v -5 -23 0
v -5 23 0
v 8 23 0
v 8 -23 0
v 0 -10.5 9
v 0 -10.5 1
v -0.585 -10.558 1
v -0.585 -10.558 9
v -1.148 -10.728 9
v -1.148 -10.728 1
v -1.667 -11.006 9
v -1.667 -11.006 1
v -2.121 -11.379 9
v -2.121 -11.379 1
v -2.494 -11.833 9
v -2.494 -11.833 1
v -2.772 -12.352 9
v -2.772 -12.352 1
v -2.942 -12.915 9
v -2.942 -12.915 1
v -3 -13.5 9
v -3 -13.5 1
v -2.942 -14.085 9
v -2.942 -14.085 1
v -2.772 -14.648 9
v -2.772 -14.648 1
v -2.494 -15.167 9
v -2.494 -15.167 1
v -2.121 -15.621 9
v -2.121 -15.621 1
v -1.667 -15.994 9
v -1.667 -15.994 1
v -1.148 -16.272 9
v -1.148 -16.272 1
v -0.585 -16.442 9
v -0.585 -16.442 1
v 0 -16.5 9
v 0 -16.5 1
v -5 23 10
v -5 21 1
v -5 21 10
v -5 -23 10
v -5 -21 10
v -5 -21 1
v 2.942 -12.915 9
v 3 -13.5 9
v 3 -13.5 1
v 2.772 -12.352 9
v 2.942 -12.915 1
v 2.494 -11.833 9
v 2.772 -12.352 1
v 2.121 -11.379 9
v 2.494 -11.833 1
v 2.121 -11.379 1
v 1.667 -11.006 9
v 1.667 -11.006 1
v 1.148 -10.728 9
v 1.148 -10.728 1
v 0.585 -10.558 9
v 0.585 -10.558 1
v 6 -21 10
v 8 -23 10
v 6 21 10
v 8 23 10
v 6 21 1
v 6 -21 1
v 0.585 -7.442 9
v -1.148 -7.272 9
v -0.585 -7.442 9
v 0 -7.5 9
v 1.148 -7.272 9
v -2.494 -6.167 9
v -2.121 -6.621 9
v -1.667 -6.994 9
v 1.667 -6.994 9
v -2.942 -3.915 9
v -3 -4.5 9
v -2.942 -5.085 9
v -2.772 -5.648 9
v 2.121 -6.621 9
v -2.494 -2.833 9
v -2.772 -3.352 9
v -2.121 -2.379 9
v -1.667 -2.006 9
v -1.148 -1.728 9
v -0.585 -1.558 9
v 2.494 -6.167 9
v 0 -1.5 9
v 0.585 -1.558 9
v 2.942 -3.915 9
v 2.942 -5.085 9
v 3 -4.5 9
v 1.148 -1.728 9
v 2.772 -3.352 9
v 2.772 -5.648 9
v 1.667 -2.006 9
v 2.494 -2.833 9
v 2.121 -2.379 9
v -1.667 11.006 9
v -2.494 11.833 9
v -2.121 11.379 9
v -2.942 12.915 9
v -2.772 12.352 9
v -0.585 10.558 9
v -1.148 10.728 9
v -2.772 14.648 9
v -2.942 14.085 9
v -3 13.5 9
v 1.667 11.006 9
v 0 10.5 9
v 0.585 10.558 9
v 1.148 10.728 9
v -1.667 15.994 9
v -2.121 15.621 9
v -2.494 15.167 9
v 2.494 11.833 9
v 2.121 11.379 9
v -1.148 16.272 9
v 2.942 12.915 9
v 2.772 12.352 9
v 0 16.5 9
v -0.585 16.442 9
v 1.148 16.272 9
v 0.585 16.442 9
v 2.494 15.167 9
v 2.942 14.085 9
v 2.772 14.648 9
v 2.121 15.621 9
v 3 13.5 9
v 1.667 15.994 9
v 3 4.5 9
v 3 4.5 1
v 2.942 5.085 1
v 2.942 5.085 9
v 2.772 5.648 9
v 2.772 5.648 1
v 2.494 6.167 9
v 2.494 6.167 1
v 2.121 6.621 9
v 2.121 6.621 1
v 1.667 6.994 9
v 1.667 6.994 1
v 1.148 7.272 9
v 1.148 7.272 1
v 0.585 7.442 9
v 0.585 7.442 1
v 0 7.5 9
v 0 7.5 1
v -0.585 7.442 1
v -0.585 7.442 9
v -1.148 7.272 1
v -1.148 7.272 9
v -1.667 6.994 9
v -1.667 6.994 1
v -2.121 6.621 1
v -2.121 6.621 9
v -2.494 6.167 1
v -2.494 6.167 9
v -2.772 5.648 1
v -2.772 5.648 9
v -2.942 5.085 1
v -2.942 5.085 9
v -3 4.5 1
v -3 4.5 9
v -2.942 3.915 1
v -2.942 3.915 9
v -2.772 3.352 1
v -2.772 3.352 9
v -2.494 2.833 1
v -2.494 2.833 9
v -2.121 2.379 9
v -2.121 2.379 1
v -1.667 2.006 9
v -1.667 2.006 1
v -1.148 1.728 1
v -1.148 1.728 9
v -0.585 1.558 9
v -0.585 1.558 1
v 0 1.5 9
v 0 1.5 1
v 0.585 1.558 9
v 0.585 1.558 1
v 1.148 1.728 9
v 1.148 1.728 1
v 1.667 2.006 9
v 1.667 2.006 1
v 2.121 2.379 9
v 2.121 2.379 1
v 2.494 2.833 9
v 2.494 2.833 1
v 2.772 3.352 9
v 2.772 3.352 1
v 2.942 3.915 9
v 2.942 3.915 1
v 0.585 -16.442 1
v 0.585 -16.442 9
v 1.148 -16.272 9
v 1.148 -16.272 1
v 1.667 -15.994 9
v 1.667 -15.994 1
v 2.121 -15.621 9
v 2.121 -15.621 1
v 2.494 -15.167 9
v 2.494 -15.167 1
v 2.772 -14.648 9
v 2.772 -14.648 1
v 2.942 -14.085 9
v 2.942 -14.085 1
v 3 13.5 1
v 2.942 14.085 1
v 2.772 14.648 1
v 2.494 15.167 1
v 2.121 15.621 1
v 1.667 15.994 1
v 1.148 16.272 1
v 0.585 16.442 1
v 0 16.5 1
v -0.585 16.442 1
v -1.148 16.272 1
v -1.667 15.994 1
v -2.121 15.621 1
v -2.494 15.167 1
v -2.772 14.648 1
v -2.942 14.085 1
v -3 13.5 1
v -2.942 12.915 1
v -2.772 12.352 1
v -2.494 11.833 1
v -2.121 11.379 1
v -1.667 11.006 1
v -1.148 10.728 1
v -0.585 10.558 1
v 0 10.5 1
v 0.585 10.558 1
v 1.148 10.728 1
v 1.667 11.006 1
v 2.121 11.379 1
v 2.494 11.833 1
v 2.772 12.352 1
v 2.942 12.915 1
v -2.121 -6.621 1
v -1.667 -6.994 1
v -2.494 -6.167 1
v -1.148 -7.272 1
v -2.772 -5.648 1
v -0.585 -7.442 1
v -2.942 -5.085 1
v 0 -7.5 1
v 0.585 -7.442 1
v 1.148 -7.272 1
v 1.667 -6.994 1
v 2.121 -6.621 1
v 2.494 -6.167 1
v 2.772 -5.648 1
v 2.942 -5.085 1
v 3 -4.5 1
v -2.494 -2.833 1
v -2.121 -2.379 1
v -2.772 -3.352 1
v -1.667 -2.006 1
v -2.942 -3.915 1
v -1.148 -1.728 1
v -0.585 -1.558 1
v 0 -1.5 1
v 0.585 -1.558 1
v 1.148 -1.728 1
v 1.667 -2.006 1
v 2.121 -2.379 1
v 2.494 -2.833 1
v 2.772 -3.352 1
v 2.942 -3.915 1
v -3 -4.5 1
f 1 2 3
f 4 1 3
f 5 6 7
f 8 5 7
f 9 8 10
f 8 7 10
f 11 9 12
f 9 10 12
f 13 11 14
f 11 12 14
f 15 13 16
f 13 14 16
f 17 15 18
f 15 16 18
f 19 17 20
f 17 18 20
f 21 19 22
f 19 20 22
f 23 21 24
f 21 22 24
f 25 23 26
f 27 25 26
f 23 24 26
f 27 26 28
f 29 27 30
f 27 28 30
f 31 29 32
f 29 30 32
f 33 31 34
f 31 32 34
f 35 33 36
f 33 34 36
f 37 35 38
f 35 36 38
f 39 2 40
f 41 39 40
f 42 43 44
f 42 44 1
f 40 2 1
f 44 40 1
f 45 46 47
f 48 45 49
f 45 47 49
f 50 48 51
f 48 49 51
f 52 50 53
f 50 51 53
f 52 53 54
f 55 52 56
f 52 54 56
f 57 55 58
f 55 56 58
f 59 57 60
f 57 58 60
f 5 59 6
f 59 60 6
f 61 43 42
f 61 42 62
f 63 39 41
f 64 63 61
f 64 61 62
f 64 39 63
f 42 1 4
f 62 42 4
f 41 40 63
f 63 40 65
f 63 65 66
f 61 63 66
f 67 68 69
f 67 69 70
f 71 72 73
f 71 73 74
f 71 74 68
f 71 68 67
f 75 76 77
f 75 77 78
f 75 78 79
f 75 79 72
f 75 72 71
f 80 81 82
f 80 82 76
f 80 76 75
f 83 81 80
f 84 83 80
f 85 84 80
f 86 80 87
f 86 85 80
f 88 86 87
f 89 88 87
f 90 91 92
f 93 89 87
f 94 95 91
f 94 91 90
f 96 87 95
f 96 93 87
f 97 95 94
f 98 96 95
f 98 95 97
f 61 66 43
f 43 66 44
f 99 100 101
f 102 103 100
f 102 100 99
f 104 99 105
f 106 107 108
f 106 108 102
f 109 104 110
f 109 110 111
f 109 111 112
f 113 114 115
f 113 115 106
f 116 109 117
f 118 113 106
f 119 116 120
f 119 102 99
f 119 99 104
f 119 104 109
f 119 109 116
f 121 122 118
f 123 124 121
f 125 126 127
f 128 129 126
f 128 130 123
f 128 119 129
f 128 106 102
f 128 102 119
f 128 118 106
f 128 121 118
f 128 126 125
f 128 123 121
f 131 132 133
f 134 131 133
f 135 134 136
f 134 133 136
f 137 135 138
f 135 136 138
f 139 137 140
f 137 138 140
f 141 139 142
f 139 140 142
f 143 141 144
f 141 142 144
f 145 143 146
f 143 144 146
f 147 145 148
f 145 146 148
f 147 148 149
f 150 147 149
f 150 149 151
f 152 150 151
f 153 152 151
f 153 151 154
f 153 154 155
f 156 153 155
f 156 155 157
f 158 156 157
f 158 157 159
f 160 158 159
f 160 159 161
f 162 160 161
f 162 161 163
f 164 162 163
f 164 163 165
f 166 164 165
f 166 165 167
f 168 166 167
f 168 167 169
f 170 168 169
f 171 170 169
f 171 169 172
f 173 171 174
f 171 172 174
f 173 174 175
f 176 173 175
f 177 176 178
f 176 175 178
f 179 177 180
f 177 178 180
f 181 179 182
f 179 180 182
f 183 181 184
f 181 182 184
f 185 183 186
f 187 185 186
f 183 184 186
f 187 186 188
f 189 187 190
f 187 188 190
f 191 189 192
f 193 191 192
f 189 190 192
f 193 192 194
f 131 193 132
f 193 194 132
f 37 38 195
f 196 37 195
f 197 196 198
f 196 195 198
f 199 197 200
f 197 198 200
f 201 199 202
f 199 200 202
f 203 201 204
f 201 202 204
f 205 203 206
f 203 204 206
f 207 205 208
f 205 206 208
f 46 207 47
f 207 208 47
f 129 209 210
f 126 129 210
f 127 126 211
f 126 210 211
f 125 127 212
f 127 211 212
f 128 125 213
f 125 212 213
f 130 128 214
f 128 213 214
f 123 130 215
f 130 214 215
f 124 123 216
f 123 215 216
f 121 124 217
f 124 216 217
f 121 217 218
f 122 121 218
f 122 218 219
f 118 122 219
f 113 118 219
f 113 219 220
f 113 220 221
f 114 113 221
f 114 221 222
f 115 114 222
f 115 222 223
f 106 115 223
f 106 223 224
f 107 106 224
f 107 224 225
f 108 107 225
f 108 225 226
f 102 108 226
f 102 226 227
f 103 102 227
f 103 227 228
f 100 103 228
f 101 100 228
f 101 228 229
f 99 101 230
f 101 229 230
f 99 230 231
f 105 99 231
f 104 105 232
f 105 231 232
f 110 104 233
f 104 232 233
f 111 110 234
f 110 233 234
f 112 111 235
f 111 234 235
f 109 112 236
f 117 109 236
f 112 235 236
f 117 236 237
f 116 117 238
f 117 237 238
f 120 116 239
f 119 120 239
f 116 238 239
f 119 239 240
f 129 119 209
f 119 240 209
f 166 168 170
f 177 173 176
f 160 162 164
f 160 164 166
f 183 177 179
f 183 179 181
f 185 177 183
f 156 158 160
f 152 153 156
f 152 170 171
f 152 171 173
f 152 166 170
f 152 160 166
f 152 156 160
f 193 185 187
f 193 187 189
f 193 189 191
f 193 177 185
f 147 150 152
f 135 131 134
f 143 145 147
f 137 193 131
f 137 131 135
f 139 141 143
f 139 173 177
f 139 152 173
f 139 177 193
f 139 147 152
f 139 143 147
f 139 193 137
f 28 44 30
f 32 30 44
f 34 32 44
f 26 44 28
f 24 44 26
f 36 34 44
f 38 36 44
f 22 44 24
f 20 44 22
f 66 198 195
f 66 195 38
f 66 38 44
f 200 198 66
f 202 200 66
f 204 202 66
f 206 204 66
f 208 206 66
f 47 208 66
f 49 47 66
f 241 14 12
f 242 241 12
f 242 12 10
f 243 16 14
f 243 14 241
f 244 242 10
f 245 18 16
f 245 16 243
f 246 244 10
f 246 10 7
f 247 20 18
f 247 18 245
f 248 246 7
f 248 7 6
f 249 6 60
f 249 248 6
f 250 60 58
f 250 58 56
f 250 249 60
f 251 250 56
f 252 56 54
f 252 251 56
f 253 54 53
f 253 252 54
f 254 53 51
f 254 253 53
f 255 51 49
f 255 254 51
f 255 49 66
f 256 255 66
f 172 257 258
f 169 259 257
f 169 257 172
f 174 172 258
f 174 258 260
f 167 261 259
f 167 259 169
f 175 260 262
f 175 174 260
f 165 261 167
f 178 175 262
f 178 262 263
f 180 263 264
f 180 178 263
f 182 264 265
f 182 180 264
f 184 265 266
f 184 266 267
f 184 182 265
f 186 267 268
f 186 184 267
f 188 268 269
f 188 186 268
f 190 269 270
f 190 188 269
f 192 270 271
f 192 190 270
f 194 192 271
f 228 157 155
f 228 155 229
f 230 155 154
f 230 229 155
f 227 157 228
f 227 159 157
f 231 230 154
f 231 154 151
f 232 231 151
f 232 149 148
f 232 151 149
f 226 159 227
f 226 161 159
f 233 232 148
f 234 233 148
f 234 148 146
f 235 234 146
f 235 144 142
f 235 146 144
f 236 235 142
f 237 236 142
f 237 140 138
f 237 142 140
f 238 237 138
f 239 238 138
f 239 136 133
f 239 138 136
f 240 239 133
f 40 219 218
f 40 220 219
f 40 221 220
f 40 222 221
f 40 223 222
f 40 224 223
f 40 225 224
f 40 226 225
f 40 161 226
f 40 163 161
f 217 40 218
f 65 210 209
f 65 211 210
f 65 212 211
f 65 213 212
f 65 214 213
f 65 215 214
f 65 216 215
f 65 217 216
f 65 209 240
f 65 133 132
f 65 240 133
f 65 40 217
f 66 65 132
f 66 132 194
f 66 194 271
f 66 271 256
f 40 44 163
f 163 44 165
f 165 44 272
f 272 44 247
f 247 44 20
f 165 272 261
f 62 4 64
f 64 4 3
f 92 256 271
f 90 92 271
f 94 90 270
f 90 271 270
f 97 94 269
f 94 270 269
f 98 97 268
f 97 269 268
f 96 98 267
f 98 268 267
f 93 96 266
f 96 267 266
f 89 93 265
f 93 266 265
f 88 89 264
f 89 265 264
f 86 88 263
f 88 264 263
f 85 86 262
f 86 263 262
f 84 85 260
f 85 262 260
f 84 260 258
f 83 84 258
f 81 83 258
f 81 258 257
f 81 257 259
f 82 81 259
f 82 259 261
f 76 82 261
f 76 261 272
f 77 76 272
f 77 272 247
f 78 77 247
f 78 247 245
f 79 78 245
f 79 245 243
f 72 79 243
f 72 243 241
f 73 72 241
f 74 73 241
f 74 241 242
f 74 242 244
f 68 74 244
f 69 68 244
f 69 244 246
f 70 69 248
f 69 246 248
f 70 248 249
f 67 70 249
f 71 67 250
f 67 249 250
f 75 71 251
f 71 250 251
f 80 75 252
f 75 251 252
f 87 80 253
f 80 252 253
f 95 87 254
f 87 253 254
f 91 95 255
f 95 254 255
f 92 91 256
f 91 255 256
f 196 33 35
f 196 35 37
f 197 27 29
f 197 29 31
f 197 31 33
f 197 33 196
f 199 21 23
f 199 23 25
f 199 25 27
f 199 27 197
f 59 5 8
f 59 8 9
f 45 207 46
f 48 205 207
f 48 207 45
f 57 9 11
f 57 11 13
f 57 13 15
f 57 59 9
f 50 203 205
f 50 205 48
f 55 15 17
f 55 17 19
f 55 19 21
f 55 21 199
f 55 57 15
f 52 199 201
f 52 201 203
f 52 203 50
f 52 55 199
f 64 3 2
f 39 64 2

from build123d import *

# Parameters (mm, degrees)
F0_R     = 3
F1_DEPTH = 1
F2_DEPTH = 10
F3_DEPTH = 9


with BuildPart() as f1:
    # F0 (on Top) → F1 (new body)
    with BuildSketch(Plane.XY):
        Polygon((5, -20), (5, 20), (-5, 20), (-5, -20), (0, -20), align=None)
        with BuildLine():
            ThreePointArc((3, -13.5), (2.12132, -15.62132), (0, -16.5))
            ThreePointArc((0, -16.5), (-3, -13.5), (0, -10.5))
            ThreePointArc((0, -10.5), (2.12132, -11.37868), (3, -13.5))
        make_face(mode=Mode.SUBTRACT)
        with BuildLine():
            ThreePointArc((3, -4.5), (2.12132, -6.62132), (0, -7.5))
            ThreePointArc((0, -7.5), (-2.12132, -2.37868), (3, -4.5))
        make_face(mode=Mode.SUBTRACT)
        with Locations((0, 4.5)):
            Circle(F0_R, mode=Mode.SUBTRACT)
        with Locations((0, 13.5)):
            Circle(F0_R, mode=Mode.SUBTRACT)
        Polygon((-5, 20), (5, 20), (5, -20), (0, -20), (-5, -20), (-5, -21), (6, -21), (6, 21), (-5, 21), align=None)
    extrude(amount=F1_DEPTH)

    # F0 (on Top) → F2 (join)
    with BuildSketch(Plane.XY):
        Polygon((-5, 23), (-5, 21), (6, 21), (6, -21), (-5, -21), (-5, -23), (8, -23), (8, 23), align=None)
    extrude(amount=F2_DEPTH)

    # F0 (on Top) → F3 (join)
    with BuildSketch(Plane.XY):
        with Locations((0, 13.5)):
            Circle(F0_R)
        with Locations((0, 4.5)):
            Circle(F0_R)
        with BuildLine():
            ThreePointArc((3, -4.5), (-2.12132, -2.37868), (0, -7.5))
            ThreePointArc((0, -7.5), (2.12132, -6.62132), (3, -4.5))
        make_face()
        with BuildLine():
            Line((0, -13.5), (0, -16.5))
            ThreePointArc((0, -16.5), (2.12132, -15.62132), (3, -13.5))
            ThreePointArc((3, -13.5), (2.12132, -11.37868), (0, -10.5))
            Line((0, -10.5), (0, -13.5))
        make_face()
        with BuildLine():
            ThreePointArc((0, -10.5), (-3, -13.5), (0, -16.5))
            Line((0, -16.5), (0, -13.5))
            Line((0, -13.5), (0, -10.5))
        make_face()
    extrude(amount=F3_DEPTH)


solid = f1.part
